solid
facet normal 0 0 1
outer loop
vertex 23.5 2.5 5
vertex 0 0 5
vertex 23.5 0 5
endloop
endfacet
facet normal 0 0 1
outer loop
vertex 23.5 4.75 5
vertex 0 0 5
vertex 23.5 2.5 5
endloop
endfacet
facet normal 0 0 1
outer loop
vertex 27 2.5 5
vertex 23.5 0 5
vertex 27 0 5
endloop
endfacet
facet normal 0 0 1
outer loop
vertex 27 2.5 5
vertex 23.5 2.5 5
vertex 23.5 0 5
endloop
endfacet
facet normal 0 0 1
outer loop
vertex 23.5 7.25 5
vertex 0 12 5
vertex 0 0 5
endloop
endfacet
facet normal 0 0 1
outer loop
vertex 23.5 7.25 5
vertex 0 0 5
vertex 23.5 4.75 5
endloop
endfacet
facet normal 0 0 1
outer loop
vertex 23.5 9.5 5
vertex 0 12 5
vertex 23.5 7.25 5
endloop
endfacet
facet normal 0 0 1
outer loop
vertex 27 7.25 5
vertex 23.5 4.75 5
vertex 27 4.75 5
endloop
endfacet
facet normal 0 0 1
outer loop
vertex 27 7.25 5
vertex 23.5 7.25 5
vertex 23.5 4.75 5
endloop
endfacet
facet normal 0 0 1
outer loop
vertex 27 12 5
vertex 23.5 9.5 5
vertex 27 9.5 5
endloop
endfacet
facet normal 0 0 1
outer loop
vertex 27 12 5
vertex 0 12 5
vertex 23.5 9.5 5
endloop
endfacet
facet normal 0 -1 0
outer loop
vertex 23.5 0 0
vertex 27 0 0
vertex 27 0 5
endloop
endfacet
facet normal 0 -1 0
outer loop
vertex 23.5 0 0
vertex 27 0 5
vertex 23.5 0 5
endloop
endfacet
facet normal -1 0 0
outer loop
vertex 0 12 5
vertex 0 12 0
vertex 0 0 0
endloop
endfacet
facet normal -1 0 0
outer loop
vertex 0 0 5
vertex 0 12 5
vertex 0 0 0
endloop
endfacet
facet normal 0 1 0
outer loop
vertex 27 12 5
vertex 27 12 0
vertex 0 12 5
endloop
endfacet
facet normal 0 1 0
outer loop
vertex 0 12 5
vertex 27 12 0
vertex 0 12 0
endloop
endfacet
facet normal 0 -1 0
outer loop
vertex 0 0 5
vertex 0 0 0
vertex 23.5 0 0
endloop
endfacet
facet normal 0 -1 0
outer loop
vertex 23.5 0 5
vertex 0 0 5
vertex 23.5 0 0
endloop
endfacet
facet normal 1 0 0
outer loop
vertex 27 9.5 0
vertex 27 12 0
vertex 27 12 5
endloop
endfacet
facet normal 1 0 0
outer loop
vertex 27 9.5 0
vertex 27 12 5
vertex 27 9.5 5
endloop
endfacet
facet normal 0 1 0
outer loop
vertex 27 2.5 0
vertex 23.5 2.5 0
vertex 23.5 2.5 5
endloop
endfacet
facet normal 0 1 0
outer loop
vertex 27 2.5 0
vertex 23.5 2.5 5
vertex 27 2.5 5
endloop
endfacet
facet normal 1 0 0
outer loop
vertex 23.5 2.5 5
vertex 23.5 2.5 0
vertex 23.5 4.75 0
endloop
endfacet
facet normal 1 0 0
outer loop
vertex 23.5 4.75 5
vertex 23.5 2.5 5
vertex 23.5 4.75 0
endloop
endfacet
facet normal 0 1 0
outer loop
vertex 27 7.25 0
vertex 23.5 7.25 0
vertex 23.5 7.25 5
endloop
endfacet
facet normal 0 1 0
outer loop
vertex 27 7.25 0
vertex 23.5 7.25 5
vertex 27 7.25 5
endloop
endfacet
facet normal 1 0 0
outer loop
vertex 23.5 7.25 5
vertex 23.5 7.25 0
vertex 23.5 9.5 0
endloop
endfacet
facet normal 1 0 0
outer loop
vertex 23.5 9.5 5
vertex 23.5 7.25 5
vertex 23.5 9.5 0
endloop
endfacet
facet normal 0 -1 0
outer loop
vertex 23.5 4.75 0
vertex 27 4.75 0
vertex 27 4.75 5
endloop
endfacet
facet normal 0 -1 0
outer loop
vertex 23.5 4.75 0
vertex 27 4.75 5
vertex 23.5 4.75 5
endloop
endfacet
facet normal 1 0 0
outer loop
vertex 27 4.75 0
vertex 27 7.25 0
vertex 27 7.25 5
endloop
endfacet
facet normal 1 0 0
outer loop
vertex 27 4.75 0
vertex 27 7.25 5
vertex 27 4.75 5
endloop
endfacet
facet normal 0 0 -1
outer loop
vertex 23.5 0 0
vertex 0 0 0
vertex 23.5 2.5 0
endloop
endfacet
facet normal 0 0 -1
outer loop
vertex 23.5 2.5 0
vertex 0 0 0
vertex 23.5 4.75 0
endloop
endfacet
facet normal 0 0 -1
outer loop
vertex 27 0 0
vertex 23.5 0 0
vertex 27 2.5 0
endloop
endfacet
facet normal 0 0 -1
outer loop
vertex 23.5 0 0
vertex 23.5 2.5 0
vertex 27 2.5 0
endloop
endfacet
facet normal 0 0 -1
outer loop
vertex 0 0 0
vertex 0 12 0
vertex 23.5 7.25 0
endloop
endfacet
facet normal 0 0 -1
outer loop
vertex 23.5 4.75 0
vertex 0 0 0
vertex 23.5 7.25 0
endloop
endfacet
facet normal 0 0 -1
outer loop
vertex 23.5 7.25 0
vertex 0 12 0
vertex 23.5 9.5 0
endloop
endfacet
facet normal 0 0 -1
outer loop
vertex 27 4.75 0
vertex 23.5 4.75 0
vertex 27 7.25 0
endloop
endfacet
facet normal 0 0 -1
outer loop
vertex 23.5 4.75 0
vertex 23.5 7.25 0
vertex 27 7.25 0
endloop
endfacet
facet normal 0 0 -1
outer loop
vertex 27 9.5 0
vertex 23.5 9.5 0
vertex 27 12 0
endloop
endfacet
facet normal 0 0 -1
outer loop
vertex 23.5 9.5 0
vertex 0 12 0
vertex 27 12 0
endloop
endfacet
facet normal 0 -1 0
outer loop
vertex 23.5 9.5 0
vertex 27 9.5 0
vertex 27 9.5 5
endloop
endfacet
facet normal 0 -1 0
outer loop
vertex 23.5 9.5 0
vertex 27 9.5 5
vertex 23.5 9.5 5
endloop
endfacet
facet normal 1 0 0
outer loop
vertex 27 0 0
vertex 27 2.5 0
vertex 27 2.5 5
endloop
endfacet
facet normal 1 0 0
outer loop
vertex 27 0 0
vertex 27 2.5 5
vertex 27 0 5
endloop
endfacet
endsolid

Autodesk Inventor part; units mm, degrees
ref_plane "YZ Plane" through (0, 0, 0) normal (1, 0, 0) x (0, 1, 0)
ref_plane "XZ Plane" through (0, 0, 0) normal (0, 1, 0) x (-1, 0, 0)
ref_plane "XY Plane" through (0, 0, 0) normal (0, 0, 1) x (1, 0, 0)
sketch "Sketch1" plane through (0, 0, 0) normal (0, 0, 1) x (1, 0, 0)
  line L0 (27, 12) -> (0, 12)
  line L1 (0, 12) -> (0, 0)
  line L2 (27, 12) -> (27, 9.5)
  line L3 (27, 9.5) -> (23.5, 9.5)
  line L4 (23.5, 2.5) -> (27, 2.5)
  line L5 (27, 2.5) -> (27, 0)
  line L6 (27, 0) -> (23.5, 0)
  line L7 (23.5, 7.25) -> (27, 7.25)
  line L8 (27, 7.25) -> (27, 4.75)
  line L9 (27, 4.75) -> (23.5, 4.75)
  line L10 (23.5, 2.5) -> (23.5, 4.75)
  line L11 (23.5, 7.25) -> (23.5, 9.5)
  line L12 (0, 0) -> (27, 0)
  dimension "d2" = 2.5
  dimension "d4" = 2.5
  dimension "d8" = 2.5
  dimension "d9" = 2.25
  dimension "d10" = 7
  dimension "d11" = 27
  dimension "d12" = 12
  dimension "d13" = 3.5
  dimension "d14" = 3.5
  dimension "d15" = 3.5
extrude "Extrusion1" add sketch "Sketch1" along normal blind 5
equation "\"d4\" = d2"
equation "\"d8\" = d2"
equation "\"d9\" = -0.5 * d8 + 0.5 * d10"
equation "\"d14\" = d13"
properties part number "FVT LITTLEBEE BLHeli 20A ESC" material "Nylon 6/6"
